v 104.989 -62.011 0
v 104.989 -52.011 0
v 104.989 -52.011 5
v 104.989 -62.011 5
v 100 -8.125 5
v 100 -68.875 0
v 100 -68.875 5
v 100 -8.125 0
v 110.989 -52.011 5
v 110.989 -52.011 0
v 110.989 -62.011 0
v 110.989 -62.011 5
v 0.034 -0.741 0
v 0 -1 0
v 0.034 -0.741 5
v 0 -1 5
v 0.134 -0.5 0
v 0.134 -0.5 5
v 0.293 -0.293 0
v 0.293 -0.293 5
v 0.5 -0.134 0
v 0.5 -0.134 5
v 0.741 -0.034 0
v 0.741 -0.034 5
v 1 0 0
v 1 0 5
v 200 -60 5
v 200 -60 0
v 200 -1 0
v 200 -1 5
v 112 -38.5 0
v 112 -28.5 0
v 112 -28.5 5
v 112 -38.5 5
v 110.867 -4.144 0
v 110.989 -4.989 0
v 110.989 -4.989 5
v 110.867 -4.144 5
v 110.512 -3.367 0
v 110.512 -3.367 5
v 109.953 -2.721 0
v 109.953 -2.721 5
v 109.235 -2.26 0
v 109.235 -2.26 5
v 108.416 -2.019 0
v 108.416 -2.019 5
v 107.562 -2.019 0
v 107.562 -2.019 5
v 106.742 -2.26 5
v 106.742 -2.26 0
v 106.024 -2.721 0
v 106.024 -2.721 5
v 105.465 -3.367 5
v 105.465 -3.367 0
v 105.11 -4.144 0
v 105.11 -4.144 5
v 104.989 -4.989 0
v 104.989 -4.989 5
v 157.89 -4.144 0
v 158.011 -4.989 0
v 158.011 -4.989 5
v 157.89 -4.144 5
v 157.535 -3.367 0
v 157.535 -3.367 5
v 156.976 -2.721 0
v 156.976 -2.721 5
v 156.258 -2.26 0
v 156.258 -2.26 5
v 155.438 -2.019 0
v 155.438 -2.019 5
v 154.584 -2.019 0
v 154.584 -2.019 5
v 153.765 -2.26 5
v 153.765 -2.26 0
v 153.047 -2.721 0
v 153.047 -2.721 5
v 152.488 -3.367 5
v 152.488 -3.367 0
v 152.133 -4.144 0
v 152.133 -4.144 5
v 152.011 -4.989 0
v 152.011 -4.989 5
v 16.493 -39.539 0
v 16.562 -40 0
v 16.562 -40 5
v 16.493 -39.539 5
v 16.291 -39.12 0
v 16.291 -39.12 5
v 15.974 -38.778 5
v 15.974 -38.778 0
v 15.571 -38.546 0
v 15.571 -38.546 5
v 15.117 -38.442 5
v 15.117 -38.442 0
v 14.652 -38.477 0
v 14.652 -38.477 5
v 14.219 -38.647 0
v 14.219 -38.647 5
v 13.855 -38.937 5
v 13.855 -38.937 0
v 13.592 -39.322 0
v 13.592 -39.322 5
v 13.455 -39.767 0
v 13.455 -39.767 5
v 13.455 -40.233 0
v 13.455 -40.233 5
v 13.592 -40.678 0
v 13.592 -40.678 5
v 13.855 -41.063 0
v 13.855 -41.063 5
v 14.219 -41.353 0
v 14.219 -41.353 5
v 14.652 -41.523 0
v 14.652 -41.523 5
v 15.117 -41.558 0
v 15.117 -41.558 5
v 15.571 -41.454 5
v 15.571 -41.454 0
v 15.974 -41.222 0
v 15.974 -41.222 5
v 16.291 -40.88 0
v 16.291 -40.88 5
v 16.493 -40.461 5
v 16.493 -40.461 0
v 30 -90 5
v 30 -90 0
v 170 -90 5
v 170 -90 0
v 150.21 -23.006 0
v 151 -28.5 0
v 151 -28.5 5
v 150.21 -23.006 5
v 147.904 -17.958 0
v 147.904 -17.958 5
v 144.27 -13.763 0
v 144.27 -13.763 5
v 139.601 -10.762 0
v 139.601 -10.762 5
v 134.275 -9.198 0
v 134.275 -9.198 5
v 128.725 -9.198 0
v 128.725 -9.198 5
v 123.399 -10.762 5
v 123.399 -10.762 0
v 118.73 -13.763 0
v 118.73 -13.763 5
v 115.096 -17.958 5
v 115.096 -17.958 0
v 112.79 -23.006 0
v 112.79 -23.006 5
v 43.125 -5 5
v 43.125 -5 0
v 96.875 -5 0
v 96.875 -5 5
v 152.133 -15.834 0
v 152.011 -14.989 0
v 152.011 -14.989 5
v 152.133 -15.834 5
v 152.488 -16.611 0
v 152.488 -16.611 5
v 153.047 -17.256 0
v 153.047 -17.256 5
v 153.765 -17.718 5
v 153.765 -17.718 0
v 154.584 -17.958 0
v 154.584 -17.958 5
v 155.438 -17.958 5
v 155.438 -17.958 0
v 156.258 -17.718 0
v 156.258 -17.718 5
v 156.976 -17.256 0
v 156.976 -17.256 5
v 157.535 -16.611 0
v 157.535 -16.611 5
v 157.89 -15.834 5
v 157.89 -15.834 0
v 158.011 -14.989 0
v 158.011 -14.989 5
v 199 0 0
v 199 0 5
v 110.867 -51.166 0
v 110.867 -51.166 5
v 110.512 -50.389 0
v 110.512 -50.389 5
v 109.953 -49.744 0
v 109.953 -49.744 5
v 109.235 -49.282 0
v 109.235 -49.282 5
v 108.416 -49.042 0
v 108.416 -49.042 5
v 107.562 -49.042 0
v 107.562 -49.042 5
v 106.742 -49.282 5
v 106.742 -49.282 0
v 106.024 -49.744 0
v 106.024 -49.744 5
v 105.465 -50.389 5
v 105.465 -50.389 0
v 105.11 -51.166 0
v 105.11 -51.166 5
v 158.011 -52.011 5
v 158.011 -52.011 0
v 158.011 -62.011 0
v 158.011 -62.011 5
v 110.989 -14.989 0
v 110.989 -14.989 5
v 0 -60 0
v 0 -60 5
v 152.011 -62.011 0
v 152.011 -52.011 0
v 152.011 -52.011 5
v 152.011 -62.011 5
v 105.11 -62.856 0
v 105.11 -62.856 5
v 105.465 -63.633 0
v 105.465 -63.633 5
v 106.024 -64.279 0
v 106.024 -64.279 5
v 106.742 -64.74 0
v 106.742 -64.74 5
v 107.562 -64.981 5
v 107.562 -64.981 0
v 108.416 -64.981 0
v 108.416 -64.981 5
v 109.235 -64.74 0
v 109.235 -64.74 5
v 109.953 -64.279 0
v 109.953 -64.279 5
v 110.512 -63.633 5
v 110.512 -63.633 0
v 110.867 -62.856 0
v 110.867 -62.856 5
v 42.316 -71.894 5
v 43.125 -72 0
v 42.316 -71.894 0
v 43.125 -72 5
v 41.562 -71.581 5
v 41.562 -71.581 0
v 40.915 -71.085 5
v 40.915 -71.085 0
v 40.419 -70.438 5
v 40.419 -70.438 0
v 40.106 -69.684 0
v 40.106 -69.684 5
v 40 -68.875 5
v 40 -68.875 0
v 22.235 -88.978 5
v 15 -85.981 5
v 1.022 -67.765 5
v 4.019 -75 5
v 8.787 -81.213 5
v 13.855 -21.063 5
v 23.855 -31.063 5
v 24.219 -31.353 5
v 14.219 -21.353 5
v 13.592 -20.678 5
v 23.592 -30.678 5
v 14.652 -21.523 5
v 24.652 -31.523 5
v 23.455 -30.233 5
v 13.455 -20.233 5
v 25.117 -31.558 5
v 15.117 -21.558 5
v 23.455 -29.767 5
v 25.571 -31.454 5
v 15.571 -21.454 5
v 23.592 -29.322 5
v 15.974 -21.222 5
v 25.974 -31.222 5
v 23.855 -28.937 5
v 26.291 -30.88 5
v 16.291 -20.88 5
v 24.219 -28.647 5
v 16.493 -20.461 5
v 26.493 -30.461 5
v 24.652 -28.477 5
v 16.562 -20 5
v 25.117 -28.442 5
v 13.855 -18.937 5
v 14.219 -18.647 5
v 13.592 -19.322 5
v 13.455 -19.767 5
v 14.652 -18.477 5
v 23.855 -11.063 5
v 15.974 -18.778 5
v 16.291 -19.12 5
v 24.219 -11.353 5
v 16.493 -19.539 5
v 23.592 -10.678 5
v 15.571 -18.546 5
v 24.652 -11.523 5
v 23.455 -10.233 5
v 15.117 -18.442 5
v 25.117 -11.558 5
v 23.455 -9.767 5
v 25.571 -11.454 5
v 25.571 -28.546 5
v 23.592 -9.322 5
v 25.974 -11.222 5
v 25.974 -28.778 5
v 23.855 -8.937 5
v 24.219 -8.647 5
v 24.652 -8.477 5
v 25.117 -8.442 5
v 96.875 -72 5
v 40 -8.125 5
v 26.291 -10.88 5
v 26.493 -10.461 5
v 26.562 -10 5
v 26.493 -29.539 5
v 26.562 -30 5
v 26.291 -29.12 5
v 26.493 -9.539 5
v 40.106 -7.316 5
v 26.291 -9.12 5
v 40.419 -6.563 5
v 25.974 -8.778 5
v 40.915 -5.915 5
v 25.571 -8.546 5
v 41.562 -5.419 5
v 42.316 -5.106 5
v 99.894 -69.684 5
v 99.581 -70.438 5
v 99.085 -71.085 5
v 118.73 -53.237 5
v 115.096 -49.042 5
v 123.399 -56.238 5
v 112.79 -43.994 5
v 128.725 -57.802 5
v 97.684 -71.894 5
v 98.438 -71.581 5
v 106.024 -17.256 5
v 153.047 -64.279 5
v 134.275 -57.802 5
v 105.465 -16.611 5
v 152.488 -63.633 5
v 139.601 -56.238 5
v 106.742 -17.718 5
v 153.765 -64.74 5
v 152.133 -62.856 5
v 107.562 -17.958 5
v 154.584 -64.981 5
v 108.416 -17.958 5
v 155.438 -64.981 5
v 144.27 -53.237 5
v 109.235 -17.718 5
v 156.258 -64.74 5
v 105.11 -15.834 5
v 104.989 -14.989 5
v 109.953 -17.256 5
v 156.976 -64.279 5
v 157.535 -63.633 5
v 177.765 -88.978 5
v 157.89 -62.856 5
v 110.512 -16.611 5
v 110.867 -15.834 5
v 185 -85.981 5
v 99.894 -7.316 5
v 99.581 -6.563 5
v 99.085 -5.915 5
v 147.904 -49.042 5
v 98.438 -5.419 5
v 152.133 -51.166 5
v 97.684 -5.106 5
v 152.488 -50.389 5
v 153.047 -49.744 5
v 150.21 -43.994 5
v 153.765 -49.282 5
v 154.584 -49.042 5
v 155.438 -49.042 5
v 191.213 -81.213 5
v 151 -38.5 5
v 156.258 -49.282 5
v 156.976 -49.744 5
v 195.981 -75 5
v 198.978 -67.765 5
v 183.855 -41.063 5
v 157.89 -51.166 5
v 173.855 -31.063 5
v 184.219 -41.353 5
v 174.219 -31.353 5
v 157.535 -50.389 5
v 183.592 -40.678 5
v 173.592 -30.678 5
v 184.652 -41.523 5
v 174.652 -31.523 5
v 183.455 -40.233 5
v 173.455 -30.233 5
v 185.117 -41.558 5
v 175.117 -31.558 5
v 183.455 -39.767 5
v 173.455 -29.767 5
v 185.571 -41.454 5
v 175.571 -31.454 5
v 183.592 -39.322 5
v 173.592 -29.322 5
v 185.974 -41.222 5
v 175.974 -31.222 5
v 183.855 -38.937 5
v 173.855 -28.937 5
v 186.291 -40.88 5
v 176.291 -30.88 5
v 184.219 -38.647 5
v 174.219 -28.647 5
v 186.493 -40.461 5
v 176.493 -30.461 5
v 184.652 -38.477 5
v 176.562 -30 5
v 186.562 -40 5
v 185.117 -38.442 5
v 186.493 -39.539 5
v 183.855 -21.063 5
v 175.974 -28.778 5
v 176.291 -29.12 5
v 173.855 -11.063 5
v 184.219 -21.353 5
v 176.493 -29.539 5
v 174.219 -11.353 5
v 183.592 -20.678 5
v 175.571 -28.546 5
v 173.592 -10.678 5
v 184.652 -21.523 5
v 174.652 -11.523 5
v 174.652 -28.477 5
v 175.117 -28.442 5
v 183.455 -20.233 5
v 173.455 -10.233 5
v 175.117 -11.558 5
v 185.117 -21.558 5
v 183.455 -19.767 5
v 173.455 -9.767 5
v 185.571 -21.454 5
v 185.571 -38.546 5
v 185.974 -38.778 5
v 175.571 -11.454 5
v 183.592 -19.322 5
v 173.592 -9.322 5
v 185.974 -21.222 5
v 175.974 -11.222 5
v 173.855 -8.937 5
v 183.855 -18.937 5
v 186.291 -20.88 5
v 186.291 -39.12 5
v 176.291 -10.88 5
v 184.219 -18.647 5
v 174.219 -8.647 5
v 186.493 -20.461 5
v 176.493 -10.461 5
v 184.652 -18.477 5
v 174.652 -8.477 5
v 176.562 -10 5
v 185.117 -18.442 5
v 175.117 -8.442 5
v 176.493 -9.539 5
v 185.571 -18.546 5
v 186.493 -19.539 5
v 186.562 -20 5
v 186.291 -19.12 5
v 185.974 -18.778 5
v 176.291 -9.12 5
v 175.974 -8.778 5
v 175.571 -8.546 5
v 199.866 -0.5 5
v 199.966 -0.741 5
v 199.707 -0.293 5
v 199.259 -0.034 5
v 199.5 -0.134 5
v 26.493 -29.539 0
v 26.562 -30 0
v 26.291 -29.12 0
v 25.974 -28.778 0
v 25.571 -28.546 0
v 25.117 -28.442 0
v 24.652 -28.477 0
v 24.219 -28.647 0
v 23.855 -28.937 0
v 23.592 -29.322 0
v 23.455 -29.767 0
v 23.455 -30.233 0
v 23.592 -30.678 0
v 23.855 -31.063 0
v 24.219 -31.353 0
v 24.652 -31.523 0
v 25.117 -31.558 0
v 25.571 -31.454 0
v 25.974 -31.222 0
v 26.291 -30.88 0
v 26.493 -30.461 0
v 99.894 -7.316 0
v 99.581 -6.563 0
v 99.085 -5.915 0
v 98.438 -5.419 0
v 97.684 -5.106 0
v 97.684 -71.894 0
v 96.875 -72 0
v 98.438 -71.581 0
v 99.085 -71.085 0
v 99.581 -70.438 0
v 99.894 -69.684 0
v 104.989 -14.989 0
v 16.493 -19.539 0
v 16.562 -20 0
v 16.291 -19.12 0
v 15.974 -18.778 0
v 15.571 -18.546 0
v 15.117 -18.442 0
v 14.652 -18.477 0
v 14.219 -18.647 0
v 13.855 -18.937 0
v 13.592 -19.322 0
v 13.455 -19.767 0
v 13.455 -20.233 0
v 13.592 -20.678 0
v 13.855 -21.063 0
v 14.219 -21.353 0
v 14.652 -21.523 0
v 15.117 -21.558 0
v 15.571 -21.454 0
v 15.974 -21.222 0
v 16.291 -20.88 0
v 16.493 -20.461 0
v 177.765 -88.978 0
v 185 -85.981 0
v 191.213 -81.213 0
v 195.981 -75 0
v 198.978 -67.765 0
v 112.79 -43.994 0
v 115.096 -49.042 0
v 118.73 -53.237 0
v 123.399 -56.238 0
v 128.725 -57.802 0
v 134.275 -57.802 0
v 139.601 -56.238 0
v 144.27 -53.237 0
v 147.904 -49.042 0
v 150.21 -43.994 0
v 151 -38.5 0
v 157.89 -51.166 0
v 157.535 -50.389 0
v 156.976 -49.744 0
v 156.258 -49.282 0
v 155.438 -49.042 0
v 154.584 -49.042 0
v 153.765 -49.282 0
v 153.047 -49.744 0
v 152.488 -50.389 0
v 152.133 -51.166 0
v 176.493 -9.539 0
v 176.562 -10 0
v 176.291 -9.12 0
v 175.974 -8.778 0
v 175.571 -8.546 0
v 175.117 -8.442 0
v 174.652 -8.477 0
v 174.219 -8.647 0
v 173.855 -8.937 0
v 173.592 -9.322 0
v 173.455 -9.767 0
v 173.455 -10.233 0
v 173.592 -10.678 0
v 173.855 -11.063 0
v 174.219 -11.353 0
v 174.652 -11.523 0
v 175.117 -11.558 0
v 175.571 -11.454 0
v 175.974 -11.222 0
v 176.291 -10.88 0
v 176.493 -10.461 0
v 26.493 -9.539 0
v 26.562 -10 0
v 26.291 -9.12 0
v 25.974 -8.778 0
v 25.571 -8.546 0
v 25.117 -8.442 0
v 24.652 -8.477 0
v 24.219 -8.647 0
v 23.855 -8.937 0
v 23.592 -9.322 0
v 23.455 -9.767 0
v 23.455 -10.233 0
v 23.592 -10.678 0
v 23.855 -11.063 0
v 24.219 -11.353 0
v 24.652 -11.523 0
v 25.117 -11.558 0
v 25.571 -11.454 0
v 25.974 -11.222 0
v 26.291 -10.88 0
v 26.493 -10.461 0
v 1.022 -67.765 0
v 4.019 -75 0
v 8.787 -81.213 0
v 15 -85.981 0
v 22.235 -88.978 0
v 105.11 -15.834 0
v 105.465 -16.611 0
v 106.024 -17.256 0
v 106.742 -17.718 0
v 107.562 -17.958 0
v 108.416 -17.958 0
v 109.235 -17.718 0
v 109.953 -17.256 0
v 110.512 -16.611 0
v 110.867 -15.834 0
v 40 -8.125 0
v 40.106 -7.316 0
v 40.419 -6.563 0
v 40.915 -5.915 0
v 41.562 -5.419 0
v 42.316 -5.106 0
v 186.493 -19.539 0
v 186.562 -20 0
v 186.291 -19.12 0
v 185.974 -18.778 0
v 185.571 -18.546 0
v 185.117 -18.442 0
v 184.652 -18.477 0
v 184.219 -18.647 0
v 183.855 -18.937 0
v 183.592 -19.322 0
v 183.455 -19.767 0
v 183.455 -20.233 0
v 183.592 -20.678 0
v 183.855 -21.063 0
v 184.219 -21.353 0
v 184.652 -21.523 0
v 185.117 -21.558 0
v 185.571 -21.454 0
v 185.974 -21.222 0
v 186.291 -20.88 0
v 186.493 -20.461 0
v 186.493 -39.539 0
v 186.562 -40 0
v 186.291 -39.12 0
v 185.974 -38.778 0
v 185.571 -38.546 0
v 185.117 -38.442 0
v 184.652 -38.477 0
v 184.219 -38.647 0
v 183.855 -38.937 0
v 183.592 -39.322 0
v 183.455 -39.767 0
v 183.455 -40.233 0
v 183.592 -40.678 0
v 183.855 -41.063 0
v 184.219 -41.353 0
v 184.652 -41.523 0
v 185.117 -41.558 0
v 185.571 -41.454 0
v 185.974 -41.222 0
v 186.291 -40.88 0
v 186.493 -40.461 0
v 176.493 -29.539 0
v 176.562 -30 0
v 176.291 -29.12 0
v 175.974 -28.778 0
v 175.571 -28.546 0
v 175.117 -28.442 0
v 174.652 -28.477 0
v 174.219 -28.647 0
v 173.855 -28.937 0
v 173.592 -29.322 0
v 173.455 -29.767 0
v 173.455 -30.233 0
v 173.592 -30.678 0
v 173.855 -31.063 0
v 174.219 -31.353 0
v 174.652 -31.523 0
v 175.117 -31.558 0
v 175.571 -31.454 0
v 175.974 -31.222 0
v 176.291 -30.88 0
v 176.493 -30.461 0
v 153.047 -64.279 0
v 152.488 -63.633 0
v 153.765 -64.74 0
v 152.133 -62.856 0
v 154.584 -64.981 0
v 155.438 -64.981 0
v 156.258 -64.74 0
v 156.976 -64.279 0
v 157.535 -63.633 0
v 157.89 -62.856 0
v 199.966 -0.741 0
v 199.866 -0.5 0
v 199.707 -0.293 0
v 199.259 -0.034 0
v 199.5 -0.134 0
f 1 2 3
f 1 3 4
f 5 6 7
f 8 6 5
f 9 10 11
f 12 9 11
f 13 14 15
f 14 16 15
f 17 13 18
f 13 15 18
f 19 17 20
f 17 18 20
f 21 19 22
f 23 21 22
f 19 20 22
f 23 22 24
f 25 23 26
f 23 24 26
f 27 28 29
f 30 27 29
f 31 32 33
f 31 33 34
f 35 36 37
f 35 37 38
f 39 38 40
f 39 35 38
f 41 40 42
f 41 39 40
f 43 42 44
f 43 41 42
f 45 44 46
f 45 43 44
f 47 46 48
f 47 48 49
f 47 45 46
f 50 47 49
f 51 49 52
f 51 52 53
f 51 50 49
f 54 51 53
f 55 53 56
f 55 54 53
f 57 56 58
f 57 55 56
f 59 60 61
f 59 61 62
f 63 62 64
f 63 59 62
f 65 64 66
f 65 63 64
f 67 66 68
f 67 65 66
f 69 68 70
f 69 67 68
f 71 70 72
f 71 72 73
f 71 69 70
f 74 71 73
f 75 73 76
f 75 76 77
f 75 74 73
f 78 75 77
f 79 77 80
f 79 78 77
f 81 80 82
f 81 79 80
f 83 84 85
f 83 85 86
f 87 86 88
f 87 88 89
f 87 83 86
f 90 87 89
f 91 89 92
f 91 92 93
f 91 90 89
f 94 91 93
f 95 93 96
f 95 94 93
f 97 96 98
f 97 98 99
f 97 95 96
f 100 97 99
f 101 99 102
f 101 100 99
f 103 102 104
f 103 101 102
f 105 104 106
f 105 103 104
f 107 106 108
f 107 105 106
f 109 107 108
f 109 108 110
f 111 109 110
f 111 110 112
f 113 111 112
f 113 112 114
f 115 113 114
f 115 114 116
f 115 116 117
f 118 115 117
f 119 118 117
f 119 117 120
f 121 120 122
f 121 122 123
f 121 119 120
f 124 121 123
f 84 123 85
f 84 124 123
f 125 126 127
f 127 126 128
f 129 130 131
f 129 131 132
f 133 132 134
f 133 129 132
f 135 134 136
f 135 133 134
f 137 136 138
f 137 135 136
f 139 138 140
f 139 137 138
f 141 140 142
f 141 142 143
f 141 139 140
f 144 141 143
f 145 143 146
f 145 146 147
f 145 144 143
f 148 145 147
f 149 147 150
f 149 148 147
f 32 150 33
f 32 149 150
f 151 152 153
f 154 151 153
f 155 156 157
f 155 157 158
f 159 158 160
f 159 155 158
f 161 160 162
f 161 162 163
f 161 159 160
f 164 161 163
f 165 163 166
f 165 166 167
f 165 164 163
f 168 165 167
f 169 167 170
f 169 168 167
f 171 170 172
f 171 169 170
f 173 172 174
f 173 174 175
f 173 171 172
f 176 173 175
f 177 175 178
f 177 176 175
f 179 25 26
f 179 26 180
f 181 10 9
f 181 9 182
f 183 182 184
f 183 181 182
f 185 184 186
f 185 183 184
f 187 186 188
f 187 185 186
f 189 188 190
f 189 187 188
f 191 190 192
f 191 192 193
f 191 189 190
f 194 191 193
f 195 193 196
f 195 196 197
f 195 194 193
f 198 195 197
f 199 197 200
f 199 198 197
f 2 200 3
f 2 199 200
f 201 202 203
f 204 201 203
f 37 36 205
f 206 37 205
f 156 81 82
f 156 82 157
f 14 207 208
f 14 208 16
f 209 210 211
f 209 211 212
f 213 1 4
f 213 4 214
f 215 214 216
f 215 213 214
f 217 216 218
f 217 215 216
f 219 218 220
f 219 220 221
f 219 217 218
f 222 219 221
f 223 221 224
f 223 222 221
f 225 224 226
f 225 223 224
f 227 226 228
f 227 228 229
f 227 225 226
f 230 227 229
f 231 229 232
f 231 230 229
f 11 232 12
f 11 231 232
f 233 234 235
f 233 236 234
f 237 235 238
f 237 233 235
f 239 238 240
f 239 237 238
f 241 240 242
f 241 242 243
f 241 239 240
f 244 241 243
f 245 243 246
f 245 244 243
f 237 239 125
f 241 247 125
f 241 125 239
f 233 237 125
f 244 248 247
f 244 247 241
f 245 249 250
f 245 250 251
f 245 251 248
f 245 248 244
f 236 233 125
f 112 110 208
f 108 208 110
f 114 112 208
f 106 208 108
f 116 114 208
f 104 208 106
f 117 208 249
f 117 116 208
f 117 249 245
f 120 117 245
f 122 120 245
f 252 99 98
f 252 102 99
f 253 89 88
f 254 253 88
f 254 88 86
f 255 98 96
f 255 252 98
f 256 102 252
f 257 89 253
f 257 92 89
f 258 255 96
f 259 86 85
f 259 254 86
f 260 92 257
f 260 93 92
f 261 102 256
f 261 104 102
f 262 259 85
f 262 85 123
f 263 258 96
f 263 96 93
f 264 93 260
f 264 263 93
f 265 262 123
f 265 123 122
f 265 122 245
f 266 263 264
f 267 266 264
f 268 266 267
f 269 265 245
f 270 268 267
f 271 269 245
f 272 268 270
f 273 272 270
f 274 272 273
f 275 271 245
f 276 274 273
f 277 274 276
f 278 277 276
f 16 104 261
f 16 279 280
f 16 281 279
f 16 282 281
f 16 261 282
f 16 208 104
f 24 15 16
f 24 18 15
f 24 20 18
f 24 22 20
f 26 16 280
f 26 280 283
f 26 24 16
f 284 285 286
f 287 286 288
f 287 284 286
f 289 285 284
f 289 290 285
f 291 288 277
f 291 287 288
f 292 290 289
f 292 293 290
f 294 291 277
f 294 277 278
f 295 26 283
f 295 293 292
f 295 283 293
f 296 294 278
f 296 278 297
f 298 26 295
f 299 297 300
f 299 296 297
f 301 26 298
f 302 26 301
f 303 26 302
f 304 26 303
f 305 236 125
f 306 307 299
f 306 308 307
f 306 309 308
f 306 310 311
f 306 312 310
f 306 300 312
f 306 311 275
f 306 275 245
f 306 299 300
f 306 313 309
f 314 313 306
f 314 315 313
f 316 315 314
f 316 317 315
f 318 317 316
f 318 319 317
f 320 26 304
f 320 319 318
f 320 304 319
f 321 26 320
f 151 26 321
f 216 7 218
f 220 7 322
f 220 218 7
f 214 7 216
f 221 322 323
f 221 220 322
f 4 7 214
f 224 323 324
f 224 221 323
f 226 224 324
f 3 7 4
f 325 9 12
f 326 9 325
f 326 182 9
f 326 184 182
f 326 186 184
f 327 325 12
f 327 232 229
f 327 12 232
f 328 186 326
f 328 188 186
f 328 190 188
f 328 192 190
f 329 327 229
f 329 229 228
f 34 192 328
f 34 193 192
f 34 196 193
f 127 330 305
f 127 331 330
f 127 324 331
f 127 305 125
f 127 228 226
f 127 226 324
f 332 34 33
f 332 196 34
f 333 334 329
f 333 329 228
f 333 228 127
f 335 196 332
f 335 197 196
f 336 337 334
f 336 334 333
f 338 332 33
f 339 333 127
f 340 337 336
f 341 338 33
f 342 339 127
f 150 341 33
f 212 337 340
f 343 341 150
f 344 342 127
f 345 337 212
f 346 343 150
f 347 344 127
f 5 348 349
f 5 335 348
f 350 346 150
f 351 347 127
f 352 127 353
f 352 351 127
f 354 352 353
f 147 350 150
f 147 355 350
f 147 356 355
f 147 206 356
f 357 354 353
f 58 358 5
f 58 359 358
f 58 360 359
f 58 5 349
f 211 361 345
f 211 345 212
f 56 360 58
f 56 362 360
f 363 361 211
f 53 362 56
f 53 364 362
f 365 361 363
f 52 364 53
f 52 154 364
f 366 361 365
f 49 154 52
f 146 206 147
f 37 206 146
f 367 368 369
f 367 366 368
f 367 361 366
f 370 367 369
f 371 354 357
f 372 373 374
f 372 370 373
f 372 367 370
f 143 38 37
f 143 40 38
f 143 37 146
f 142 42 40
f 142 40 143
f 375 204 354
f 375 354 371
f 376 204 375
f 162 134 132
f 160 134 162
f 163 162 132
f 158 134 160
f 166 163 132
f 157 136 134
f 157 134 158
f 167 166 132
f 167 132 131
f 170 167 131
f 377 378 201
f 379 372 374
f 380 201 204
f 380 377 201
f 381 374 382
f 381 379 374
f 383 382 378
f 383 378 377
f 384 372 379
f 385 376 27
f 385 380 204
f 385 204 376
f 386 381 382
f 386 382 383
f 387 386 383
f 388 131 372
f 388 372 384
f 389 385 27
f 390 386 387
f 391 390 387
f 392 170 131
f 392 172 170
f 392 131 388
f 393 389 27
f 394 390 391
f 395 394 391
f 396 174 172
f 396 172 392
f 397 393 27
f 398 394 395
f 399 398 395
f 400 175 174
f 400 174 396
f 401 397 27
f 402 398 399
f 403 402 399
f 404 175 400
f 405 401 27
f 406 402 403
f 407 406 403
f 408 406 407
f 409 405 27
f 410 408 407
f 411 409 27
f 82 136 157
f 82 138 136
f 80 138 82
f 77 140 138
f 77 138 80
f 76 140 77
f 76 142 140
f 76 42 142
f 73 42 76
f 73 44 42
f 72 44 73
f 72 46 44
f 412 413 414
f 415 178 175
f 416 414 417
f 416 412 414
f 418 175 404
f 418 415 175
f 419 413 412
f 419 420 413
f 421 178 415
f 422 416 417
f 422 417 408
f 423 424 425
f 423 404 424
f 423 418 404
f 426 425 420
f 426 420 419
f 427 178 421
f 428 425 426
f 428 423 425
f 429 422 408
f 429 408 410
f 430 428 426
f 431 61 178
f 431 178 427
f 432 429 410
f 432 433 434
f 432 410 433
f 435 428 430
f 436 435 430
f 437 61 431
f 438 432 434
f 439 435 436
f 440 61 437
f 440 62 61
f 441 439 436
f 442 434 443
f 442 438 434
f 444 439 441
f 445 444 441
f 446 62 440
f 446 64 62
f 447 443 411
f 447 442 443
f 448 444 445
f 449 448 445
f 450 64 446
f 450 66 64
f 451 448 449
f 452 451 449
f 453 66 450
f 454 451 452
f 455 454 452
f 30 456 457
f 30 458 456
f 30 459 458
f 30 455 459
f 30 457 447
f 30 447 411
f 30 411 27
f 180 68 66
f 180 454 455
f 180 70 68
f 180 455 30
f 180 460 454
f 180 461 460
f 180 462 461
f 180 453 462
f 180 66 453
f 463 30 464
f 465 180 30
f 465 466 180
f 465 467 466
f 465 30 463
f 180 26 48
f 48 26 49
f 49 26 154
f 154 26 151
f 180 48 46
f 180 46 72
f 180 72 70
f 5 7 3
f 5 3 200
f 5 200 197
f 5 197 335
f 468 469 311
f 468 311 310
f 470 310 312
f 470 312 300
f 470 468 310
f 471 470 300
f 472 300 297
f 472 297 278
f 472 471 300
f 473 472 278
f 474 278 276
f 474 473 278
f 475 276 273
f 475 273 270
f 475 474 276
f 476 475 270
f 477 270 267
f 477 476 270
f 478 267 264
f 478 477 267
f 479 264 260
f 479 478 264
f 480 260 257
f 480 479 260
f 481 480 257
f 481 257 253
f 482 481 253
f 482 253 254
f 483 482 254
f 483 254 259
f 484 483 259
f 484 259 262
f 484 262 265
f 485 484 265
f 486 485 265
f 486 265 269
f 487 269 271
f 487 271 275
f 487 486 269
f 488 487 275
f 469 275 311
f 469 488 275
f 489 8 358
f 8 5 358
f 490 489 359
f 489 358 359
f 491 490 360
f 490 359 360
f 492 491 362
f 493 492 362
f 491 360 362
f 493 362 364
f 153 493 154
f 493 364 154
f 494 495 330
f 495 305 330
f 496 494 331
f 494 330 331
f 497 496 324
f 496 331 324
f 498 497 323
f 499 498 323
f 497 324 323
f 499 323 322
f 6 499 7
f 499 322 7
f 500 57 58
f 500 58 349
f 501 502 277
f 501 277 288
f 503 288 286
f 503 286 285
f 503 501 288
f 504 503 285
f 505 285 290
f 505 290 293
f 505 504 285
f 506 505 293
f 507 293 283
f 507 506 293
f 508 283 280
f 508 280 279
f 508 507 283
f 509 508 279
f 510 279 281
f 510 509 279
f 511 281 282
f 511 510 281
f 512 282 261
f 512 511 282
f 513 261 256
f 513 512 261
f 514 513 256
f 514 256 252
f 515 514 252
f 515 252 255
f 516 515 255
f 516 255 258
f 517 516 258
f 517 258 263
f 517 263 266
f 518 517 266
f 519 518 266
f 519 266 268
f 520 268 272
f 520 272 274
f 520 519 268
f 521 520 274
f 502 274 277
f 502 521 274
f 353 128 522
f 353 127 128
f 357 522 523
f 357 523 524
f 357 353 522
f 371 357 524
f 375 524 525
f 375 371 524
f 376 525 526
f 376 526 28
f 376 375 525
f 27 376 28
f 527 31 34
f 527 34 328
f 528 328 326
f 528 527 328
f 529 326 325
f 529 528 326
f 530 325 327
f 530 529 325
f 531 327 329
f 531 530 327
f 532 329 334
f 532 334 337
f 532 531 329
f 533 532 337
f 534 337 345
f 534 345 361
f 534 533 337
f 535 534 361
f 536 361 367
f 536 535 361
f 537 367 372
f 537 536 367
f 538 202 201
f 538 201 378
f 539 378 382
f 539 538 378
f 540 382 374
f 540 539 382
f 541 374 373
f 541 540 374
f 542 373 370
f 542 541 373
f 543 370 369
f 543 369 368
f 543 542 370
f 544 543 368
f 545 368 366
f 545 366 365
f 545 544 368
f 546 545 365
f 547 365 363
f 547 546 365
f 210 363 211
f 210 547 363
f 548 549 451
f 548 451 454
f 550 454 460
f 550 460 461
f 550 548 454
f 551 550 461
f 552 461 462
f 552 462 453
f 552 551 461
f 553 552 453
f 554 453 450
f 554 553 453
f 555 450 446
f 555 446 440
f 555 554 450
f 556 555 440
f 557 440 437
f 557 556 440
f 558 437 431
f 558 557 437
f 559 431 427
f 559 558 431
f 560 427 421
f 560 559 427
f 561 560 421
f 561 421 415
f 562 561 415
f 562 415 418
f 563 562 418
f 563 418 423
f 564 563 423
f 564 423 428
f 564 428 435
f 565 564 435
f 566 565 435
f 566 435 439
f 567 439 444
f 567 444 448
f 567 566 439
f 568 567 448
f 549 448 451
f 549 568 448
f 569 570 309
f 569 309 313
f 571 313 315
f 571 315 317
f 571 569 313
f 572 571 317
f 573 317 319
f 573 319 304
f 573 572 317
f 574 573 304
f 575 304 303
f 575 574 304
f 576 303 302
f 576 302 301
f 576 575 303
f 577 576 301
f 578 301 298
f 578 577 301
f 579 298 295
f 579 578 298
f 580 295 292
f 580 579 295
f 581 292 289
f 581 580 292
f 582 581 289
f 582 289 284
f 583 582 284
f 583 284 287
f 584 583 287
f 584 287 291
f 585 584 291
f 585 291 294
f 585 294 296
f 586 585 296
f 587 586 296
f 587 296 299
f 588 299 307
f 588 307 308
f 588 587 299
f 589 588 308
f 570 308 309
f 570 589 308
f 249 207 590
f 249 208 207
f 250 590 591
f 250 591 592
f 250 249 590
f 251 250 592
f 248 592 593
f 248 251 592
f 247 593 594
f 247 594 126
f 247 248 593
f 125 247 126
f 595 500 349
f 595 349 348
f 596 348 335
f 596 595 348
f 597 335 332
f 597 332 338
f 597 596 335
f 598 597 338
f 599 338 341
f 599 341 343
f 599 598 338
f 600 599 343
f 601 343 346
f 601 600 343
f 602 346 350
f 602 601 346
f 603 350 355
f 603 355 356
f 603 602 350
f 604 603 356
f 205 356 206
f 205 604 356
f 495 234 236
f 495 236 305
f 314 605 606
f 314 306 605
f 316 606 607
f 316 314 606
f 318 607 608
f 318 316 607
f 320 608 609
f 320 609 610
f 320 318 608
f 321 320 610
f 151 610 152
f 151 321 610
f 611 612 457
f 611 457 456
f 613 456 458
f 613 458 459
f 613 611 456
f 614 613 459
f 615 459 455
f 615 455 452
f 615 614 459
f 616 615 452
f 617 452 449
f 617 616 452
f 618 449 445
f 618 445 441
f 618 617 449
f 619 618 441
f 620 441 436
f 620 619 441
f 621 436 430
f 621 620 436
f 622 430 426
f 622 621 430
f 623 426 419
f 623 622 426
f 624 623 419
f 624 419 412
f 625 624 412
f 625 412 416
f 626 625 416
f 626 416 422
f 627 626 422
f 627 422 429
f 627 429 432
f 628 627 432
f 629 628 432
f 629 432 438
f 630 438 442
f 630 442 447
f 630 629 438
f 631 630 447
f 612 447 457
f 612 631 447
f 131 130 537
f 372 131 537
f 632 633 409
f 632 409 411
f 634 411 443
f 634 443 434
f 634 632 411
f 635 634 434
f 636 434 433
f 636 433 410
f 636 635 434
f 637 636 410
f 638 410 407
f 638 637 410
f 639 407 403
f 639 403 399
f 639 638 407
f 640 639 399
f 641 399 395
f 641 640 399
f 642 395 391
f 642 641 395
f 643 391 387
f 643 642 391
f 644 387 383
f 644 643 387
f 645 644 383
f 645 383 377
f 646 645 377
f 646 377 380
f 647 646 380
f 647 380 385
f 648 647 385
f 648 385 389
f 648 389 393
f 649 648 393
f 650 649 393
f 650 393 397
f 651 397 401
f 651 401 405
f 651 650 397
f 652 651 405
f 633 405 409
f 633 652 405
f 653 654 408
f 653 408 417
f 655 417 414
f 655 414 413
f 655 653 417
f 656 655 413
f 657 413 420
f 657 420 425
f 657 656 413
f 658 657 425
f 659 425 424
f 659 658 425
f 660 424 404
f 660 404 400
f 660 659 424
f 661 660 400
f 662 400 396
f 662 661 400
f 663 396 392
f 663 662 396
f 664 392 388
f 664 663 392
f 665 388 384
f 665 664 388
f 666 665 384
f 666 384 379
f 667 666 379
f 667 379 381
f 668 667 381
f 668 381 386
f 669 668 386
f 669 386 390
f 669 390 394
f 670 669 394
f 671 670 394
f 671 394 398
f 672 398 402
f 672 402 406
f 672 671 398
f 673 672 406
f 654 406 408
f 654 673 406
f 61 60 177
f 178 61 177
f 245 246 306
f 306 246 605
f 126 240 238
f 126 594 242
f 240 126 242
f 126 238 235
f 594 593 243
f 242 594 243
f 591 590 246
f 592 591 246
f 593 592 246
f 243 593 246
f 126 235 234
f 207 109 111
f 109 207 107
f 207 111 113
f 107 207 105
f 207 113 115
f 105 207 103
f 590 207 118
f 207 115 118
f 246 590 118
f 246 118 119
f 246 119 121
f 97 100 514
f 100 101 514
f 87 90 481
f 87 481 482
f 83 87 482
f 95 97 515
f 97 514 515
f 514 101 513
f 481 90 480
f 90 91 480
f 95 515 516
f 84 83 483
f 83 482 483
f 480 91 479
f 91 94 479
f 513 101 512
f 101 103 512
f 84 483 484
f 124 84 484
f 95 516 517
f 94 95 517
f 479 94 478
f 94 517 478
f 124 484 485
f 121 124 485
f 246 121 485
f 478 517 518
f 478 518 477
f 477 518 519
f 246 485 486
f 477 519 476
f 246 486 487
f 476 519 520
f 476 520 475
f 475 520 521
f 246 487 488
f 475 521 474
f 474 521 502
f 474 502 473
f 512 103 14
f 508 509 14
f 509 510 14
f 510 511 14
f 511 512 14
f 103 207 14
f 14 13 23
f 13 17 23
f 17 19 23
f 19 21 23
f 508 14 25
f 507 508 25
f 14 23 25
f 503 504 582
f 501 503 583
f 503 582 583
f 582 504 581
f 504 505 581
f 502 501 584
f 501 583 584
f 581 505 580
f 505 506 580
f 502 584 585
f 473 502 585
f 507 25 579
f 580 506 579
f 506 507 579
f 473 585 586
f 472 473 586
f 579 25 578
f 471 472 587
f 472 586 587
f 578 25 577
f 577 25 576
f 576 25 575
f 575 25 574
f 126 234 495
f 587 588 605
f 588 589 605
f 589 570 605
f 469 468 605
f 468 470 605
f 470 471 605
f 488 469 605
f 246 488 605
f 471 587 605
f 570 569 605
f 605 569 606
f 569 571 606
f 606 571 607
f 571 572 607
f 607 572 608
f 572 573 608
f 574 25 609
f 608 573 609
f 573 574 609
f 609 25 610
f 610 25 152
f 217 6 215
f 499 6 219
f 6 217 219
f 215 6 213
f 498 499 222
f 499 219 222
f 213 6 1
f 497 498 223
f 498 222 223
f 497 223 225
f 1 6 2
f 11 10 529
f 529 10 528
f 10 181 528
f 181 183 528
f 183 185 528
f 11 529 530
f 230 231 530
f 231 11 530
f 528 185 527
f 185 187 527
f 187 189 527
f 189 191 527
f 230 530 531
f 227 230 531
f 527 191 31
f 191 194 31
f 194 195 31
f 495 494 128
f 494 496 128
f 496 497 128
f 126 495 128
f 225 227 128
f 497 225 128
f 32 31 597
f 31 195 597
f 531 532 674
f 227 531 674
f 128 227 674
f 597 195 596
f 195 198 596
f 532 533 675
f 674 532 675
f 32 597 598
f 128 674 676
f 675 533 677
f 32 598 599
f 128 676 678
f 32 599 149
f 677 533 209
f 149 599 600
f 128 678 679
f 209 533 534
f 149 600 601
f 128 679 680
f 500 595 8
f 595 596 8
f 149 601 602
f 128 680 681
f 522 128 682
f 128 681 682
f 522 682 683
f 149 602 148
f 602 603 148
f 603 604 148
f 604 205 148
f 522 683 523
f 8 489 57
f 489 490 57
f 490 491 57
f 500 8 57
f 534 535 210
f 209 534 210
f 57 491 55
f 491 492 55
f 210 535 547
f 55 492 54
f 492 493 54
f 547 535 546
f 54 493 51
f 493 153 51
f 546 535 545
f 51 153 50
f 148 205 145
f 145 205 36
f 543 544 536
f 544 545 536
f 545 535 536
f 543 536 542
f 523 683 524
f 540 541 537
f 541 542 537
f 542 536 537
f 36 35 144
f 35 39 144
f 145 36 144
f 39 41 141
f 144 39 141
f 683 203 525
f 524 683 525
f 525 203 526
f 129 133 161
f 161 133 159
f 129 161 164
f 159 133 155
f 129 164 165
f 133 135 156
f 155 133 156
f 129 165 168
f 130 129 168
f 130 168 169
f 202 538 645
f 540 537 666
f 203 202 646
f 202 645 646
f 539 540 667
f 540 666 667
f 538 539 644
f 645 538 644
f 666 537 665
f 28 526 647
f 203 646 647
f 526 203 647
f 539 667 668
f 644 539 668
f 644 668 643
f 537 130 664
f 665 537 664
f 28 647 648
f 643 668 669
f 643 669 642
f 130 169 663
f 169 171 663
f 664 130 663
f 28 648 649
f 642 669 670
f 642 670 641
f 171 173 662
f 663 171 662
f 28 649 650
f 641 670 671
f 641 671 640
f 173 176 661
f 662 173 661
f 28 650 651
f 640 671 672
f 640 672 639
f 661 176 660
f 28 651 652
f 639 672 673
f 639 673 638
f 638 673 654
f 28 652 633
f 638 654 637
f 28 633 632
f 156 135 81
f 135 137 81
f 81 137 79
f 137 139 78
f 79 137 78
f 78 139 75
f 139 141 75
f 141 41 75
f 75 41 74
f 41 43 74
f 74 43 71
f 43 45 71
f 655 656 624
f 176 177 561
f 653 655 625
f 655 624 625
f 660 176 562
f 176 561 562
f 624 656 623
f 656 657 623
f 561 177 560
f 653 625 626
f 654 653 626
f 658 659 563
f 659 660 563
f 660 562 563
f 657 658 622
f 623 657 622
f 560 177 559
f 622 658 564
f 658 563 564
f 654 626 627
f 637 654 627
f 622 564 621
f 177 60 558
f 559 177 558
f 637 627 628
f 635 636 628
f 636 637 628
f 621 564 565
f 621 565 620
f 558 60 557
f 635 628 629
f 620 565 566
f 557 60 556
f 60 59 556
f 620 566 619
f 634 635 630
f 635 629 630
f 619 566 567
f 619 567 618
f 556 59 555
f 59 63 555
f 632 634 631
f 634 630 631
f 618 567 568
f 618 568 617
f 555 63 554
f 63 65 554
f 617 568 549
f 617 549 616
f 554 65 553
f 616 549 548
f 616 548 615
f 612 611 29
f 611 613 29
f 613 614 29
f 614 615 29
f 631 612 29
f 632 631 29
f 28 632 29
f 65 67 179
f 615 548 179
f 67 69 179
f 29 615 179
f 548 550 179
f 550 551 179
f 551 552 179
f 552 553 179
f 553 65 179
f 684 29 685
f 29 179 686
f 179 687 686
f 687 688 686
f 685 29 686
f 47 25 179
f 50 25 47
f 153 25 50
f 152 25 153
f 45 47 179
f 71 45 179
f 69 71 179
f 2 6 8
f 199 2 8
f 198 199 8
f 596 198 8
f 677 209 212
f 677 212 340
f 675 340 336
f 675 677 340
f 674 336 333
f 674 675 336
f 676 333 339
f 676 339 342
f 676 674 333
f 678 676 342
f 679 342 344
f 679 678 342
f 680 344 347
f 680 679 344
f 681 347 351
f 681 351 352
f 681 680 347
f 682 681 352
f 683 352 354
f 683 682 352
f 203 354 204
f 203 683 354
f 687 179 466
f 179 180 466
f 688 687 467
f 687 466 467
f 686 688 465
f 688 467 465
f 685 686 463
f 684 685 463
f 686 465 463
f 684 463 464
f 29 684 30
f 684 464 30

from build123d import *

# Parameters (mm, degrees)
SKETCH_W    = 200
SKETCH_H    = 90
SKETCH_R    = 1.5625
SKETCH_W_2  = 60
SKETCH_H_2  = 67
PAD_DEPTH   = 5
FILLET_R    = 30
FILLET001_R = 3.125
FILLET002_R = 1


with BuildPart() as part:
    # Sketch → Pad (new body)
    with BuildSketch(Plane.XY):
        with Locations((100, -45)):
            Rectangle(SKETCH_W, SKETCH_H)
        with Locations((175, -10)):
            Circle(SKETCH_R, mode=Mode.SUBTRACT)
        with Locations((175, -30)):
            Circle(SKETCH_R, mode=Mode.SUBTRACT)
        with Locations((185, -20)):
            Circle(SKETCH_R, mode=Mode.SUBTRACT)
        with Locations((185, -40)):
            Circle(SKETCH_R, mode=Mode.SUBTRACT)
        with Locations((25, -10)):
            Circle(SKETCH_R, mode=Mode.SUBTRACT)
        with Locations((25, -30)):
            Circle(SKETCH_R, mode=Mode.SUBTRACT)
        with Locations((15, -20)):
            Circle(SKETCH_R, mode=Mode.SUBTRACT)
        with Locations((15, -40)):
            Circle(SKETCH_R, mode=Mode.SUBTRACT)
        with Locations((70, -38.5)):
            Rectangle(SKETCH_W_2, SKETCH_H_2, mode=Mode.SUBTRACT)
        with BuildLine():
            ThreePointArc((158.0113, -4.9887), (155.0113, -1.9887), (152.0113, -4.9887))
            Line((152.0113, -4.9887), (152.0113, -14.9887))
            ThreePointArc((152.0113, -14.9887), (155.0113, -17.9887), (158.0113, -14.9887))
            Line((158.0113, -4.9887), (158.0113, -14.9887))
        make_face(mode=Mode.SUBTRACT)
        with BuildLine():
            ThreePointArc((151, -28.5), (131.5, -9), (112, -28.5))
            Line((112, -28.5), (112, -38.5))
            ThreePointArc((112, -38.5), (131.5, -58), (151, -38.5))
            Line((151, -28.5), (151, -38.5))
        make_face(mode=Mode.SUBTRACT)
        with BuildLine():
            ThreePointArc((158.0113, -52.0113), (155.0113, -49.0113), (152.0113, -52.0113))
            Line((152.0113, -52.0113), (152.0113, -62.0113))
            ThreePointArc((152.0113, -62.0113), (155.0113, -65.0113), (158.0113, -62.0113))
            Line((158.0113, -52.0113), (158.0113, -62.0113))
        make_face(mode=Mode.SUBTRACT)
        with BuildLine():
            ThreePointArc((110.9887, -52.0113), (107.9887, -49.0113), (104.9887, -52.0113))
            Line((104.9887, -52.0113), (104.9887, -62.0113))
            ThreePointArc((104.9887, -62.0113), (107.9887, -65.0113), (110.9887, -62.0113))
            Line((110.9887, -52.0113), (110.9887, -62.0113))
        make_face(mode=Mode.SUBTRACT)
        with BuildLine():
            ThreePointArc((110.9887, -4.9887), (107.9887, -1.9887), (104.9887, -4.9887))
            Line((104.9887, -4.9887), (104.9887, -14.9887))
            ThreePointArc((104.9887, -14.9887), (107.9887, -17.9887), (110.9887, -14.9887))
            Line((110.9887, -4.9887), (110.9887, -14.9887))
        make_face(mode=Mode.SUBTRACT)
    extrude(amount=PAD_DEPTH)

    # Fillet
    fillet_edges = [part.edges().sort_by_distance(p)[0] for p in [
        (200, -90, 2.5),
        (0, -90, 2.5),
    ]]
    fillet(fillet_edges, radius=FILLET_R)

    # Fillet001
    fillet001_edges = [part.edges().sort_by_distance(p)[0] for p in [
        (100, -5, 2.5),
        (100, -72, 2.5),
        (40, -72, 2.5),
        (40, -5, 2.5),
    ]]
    fillet(fillet001_edges, radius=FILLET001_R)

    # Fillet002
    fillet002_edges = [part.edges().sort_by_distance(p)[0] for p in [
        (200, 0, 2.5),
        (0, 0, 2.5),
    ]]
    fillet(fillet002_edges, radius=FILLET002_R)


solid = part.part
